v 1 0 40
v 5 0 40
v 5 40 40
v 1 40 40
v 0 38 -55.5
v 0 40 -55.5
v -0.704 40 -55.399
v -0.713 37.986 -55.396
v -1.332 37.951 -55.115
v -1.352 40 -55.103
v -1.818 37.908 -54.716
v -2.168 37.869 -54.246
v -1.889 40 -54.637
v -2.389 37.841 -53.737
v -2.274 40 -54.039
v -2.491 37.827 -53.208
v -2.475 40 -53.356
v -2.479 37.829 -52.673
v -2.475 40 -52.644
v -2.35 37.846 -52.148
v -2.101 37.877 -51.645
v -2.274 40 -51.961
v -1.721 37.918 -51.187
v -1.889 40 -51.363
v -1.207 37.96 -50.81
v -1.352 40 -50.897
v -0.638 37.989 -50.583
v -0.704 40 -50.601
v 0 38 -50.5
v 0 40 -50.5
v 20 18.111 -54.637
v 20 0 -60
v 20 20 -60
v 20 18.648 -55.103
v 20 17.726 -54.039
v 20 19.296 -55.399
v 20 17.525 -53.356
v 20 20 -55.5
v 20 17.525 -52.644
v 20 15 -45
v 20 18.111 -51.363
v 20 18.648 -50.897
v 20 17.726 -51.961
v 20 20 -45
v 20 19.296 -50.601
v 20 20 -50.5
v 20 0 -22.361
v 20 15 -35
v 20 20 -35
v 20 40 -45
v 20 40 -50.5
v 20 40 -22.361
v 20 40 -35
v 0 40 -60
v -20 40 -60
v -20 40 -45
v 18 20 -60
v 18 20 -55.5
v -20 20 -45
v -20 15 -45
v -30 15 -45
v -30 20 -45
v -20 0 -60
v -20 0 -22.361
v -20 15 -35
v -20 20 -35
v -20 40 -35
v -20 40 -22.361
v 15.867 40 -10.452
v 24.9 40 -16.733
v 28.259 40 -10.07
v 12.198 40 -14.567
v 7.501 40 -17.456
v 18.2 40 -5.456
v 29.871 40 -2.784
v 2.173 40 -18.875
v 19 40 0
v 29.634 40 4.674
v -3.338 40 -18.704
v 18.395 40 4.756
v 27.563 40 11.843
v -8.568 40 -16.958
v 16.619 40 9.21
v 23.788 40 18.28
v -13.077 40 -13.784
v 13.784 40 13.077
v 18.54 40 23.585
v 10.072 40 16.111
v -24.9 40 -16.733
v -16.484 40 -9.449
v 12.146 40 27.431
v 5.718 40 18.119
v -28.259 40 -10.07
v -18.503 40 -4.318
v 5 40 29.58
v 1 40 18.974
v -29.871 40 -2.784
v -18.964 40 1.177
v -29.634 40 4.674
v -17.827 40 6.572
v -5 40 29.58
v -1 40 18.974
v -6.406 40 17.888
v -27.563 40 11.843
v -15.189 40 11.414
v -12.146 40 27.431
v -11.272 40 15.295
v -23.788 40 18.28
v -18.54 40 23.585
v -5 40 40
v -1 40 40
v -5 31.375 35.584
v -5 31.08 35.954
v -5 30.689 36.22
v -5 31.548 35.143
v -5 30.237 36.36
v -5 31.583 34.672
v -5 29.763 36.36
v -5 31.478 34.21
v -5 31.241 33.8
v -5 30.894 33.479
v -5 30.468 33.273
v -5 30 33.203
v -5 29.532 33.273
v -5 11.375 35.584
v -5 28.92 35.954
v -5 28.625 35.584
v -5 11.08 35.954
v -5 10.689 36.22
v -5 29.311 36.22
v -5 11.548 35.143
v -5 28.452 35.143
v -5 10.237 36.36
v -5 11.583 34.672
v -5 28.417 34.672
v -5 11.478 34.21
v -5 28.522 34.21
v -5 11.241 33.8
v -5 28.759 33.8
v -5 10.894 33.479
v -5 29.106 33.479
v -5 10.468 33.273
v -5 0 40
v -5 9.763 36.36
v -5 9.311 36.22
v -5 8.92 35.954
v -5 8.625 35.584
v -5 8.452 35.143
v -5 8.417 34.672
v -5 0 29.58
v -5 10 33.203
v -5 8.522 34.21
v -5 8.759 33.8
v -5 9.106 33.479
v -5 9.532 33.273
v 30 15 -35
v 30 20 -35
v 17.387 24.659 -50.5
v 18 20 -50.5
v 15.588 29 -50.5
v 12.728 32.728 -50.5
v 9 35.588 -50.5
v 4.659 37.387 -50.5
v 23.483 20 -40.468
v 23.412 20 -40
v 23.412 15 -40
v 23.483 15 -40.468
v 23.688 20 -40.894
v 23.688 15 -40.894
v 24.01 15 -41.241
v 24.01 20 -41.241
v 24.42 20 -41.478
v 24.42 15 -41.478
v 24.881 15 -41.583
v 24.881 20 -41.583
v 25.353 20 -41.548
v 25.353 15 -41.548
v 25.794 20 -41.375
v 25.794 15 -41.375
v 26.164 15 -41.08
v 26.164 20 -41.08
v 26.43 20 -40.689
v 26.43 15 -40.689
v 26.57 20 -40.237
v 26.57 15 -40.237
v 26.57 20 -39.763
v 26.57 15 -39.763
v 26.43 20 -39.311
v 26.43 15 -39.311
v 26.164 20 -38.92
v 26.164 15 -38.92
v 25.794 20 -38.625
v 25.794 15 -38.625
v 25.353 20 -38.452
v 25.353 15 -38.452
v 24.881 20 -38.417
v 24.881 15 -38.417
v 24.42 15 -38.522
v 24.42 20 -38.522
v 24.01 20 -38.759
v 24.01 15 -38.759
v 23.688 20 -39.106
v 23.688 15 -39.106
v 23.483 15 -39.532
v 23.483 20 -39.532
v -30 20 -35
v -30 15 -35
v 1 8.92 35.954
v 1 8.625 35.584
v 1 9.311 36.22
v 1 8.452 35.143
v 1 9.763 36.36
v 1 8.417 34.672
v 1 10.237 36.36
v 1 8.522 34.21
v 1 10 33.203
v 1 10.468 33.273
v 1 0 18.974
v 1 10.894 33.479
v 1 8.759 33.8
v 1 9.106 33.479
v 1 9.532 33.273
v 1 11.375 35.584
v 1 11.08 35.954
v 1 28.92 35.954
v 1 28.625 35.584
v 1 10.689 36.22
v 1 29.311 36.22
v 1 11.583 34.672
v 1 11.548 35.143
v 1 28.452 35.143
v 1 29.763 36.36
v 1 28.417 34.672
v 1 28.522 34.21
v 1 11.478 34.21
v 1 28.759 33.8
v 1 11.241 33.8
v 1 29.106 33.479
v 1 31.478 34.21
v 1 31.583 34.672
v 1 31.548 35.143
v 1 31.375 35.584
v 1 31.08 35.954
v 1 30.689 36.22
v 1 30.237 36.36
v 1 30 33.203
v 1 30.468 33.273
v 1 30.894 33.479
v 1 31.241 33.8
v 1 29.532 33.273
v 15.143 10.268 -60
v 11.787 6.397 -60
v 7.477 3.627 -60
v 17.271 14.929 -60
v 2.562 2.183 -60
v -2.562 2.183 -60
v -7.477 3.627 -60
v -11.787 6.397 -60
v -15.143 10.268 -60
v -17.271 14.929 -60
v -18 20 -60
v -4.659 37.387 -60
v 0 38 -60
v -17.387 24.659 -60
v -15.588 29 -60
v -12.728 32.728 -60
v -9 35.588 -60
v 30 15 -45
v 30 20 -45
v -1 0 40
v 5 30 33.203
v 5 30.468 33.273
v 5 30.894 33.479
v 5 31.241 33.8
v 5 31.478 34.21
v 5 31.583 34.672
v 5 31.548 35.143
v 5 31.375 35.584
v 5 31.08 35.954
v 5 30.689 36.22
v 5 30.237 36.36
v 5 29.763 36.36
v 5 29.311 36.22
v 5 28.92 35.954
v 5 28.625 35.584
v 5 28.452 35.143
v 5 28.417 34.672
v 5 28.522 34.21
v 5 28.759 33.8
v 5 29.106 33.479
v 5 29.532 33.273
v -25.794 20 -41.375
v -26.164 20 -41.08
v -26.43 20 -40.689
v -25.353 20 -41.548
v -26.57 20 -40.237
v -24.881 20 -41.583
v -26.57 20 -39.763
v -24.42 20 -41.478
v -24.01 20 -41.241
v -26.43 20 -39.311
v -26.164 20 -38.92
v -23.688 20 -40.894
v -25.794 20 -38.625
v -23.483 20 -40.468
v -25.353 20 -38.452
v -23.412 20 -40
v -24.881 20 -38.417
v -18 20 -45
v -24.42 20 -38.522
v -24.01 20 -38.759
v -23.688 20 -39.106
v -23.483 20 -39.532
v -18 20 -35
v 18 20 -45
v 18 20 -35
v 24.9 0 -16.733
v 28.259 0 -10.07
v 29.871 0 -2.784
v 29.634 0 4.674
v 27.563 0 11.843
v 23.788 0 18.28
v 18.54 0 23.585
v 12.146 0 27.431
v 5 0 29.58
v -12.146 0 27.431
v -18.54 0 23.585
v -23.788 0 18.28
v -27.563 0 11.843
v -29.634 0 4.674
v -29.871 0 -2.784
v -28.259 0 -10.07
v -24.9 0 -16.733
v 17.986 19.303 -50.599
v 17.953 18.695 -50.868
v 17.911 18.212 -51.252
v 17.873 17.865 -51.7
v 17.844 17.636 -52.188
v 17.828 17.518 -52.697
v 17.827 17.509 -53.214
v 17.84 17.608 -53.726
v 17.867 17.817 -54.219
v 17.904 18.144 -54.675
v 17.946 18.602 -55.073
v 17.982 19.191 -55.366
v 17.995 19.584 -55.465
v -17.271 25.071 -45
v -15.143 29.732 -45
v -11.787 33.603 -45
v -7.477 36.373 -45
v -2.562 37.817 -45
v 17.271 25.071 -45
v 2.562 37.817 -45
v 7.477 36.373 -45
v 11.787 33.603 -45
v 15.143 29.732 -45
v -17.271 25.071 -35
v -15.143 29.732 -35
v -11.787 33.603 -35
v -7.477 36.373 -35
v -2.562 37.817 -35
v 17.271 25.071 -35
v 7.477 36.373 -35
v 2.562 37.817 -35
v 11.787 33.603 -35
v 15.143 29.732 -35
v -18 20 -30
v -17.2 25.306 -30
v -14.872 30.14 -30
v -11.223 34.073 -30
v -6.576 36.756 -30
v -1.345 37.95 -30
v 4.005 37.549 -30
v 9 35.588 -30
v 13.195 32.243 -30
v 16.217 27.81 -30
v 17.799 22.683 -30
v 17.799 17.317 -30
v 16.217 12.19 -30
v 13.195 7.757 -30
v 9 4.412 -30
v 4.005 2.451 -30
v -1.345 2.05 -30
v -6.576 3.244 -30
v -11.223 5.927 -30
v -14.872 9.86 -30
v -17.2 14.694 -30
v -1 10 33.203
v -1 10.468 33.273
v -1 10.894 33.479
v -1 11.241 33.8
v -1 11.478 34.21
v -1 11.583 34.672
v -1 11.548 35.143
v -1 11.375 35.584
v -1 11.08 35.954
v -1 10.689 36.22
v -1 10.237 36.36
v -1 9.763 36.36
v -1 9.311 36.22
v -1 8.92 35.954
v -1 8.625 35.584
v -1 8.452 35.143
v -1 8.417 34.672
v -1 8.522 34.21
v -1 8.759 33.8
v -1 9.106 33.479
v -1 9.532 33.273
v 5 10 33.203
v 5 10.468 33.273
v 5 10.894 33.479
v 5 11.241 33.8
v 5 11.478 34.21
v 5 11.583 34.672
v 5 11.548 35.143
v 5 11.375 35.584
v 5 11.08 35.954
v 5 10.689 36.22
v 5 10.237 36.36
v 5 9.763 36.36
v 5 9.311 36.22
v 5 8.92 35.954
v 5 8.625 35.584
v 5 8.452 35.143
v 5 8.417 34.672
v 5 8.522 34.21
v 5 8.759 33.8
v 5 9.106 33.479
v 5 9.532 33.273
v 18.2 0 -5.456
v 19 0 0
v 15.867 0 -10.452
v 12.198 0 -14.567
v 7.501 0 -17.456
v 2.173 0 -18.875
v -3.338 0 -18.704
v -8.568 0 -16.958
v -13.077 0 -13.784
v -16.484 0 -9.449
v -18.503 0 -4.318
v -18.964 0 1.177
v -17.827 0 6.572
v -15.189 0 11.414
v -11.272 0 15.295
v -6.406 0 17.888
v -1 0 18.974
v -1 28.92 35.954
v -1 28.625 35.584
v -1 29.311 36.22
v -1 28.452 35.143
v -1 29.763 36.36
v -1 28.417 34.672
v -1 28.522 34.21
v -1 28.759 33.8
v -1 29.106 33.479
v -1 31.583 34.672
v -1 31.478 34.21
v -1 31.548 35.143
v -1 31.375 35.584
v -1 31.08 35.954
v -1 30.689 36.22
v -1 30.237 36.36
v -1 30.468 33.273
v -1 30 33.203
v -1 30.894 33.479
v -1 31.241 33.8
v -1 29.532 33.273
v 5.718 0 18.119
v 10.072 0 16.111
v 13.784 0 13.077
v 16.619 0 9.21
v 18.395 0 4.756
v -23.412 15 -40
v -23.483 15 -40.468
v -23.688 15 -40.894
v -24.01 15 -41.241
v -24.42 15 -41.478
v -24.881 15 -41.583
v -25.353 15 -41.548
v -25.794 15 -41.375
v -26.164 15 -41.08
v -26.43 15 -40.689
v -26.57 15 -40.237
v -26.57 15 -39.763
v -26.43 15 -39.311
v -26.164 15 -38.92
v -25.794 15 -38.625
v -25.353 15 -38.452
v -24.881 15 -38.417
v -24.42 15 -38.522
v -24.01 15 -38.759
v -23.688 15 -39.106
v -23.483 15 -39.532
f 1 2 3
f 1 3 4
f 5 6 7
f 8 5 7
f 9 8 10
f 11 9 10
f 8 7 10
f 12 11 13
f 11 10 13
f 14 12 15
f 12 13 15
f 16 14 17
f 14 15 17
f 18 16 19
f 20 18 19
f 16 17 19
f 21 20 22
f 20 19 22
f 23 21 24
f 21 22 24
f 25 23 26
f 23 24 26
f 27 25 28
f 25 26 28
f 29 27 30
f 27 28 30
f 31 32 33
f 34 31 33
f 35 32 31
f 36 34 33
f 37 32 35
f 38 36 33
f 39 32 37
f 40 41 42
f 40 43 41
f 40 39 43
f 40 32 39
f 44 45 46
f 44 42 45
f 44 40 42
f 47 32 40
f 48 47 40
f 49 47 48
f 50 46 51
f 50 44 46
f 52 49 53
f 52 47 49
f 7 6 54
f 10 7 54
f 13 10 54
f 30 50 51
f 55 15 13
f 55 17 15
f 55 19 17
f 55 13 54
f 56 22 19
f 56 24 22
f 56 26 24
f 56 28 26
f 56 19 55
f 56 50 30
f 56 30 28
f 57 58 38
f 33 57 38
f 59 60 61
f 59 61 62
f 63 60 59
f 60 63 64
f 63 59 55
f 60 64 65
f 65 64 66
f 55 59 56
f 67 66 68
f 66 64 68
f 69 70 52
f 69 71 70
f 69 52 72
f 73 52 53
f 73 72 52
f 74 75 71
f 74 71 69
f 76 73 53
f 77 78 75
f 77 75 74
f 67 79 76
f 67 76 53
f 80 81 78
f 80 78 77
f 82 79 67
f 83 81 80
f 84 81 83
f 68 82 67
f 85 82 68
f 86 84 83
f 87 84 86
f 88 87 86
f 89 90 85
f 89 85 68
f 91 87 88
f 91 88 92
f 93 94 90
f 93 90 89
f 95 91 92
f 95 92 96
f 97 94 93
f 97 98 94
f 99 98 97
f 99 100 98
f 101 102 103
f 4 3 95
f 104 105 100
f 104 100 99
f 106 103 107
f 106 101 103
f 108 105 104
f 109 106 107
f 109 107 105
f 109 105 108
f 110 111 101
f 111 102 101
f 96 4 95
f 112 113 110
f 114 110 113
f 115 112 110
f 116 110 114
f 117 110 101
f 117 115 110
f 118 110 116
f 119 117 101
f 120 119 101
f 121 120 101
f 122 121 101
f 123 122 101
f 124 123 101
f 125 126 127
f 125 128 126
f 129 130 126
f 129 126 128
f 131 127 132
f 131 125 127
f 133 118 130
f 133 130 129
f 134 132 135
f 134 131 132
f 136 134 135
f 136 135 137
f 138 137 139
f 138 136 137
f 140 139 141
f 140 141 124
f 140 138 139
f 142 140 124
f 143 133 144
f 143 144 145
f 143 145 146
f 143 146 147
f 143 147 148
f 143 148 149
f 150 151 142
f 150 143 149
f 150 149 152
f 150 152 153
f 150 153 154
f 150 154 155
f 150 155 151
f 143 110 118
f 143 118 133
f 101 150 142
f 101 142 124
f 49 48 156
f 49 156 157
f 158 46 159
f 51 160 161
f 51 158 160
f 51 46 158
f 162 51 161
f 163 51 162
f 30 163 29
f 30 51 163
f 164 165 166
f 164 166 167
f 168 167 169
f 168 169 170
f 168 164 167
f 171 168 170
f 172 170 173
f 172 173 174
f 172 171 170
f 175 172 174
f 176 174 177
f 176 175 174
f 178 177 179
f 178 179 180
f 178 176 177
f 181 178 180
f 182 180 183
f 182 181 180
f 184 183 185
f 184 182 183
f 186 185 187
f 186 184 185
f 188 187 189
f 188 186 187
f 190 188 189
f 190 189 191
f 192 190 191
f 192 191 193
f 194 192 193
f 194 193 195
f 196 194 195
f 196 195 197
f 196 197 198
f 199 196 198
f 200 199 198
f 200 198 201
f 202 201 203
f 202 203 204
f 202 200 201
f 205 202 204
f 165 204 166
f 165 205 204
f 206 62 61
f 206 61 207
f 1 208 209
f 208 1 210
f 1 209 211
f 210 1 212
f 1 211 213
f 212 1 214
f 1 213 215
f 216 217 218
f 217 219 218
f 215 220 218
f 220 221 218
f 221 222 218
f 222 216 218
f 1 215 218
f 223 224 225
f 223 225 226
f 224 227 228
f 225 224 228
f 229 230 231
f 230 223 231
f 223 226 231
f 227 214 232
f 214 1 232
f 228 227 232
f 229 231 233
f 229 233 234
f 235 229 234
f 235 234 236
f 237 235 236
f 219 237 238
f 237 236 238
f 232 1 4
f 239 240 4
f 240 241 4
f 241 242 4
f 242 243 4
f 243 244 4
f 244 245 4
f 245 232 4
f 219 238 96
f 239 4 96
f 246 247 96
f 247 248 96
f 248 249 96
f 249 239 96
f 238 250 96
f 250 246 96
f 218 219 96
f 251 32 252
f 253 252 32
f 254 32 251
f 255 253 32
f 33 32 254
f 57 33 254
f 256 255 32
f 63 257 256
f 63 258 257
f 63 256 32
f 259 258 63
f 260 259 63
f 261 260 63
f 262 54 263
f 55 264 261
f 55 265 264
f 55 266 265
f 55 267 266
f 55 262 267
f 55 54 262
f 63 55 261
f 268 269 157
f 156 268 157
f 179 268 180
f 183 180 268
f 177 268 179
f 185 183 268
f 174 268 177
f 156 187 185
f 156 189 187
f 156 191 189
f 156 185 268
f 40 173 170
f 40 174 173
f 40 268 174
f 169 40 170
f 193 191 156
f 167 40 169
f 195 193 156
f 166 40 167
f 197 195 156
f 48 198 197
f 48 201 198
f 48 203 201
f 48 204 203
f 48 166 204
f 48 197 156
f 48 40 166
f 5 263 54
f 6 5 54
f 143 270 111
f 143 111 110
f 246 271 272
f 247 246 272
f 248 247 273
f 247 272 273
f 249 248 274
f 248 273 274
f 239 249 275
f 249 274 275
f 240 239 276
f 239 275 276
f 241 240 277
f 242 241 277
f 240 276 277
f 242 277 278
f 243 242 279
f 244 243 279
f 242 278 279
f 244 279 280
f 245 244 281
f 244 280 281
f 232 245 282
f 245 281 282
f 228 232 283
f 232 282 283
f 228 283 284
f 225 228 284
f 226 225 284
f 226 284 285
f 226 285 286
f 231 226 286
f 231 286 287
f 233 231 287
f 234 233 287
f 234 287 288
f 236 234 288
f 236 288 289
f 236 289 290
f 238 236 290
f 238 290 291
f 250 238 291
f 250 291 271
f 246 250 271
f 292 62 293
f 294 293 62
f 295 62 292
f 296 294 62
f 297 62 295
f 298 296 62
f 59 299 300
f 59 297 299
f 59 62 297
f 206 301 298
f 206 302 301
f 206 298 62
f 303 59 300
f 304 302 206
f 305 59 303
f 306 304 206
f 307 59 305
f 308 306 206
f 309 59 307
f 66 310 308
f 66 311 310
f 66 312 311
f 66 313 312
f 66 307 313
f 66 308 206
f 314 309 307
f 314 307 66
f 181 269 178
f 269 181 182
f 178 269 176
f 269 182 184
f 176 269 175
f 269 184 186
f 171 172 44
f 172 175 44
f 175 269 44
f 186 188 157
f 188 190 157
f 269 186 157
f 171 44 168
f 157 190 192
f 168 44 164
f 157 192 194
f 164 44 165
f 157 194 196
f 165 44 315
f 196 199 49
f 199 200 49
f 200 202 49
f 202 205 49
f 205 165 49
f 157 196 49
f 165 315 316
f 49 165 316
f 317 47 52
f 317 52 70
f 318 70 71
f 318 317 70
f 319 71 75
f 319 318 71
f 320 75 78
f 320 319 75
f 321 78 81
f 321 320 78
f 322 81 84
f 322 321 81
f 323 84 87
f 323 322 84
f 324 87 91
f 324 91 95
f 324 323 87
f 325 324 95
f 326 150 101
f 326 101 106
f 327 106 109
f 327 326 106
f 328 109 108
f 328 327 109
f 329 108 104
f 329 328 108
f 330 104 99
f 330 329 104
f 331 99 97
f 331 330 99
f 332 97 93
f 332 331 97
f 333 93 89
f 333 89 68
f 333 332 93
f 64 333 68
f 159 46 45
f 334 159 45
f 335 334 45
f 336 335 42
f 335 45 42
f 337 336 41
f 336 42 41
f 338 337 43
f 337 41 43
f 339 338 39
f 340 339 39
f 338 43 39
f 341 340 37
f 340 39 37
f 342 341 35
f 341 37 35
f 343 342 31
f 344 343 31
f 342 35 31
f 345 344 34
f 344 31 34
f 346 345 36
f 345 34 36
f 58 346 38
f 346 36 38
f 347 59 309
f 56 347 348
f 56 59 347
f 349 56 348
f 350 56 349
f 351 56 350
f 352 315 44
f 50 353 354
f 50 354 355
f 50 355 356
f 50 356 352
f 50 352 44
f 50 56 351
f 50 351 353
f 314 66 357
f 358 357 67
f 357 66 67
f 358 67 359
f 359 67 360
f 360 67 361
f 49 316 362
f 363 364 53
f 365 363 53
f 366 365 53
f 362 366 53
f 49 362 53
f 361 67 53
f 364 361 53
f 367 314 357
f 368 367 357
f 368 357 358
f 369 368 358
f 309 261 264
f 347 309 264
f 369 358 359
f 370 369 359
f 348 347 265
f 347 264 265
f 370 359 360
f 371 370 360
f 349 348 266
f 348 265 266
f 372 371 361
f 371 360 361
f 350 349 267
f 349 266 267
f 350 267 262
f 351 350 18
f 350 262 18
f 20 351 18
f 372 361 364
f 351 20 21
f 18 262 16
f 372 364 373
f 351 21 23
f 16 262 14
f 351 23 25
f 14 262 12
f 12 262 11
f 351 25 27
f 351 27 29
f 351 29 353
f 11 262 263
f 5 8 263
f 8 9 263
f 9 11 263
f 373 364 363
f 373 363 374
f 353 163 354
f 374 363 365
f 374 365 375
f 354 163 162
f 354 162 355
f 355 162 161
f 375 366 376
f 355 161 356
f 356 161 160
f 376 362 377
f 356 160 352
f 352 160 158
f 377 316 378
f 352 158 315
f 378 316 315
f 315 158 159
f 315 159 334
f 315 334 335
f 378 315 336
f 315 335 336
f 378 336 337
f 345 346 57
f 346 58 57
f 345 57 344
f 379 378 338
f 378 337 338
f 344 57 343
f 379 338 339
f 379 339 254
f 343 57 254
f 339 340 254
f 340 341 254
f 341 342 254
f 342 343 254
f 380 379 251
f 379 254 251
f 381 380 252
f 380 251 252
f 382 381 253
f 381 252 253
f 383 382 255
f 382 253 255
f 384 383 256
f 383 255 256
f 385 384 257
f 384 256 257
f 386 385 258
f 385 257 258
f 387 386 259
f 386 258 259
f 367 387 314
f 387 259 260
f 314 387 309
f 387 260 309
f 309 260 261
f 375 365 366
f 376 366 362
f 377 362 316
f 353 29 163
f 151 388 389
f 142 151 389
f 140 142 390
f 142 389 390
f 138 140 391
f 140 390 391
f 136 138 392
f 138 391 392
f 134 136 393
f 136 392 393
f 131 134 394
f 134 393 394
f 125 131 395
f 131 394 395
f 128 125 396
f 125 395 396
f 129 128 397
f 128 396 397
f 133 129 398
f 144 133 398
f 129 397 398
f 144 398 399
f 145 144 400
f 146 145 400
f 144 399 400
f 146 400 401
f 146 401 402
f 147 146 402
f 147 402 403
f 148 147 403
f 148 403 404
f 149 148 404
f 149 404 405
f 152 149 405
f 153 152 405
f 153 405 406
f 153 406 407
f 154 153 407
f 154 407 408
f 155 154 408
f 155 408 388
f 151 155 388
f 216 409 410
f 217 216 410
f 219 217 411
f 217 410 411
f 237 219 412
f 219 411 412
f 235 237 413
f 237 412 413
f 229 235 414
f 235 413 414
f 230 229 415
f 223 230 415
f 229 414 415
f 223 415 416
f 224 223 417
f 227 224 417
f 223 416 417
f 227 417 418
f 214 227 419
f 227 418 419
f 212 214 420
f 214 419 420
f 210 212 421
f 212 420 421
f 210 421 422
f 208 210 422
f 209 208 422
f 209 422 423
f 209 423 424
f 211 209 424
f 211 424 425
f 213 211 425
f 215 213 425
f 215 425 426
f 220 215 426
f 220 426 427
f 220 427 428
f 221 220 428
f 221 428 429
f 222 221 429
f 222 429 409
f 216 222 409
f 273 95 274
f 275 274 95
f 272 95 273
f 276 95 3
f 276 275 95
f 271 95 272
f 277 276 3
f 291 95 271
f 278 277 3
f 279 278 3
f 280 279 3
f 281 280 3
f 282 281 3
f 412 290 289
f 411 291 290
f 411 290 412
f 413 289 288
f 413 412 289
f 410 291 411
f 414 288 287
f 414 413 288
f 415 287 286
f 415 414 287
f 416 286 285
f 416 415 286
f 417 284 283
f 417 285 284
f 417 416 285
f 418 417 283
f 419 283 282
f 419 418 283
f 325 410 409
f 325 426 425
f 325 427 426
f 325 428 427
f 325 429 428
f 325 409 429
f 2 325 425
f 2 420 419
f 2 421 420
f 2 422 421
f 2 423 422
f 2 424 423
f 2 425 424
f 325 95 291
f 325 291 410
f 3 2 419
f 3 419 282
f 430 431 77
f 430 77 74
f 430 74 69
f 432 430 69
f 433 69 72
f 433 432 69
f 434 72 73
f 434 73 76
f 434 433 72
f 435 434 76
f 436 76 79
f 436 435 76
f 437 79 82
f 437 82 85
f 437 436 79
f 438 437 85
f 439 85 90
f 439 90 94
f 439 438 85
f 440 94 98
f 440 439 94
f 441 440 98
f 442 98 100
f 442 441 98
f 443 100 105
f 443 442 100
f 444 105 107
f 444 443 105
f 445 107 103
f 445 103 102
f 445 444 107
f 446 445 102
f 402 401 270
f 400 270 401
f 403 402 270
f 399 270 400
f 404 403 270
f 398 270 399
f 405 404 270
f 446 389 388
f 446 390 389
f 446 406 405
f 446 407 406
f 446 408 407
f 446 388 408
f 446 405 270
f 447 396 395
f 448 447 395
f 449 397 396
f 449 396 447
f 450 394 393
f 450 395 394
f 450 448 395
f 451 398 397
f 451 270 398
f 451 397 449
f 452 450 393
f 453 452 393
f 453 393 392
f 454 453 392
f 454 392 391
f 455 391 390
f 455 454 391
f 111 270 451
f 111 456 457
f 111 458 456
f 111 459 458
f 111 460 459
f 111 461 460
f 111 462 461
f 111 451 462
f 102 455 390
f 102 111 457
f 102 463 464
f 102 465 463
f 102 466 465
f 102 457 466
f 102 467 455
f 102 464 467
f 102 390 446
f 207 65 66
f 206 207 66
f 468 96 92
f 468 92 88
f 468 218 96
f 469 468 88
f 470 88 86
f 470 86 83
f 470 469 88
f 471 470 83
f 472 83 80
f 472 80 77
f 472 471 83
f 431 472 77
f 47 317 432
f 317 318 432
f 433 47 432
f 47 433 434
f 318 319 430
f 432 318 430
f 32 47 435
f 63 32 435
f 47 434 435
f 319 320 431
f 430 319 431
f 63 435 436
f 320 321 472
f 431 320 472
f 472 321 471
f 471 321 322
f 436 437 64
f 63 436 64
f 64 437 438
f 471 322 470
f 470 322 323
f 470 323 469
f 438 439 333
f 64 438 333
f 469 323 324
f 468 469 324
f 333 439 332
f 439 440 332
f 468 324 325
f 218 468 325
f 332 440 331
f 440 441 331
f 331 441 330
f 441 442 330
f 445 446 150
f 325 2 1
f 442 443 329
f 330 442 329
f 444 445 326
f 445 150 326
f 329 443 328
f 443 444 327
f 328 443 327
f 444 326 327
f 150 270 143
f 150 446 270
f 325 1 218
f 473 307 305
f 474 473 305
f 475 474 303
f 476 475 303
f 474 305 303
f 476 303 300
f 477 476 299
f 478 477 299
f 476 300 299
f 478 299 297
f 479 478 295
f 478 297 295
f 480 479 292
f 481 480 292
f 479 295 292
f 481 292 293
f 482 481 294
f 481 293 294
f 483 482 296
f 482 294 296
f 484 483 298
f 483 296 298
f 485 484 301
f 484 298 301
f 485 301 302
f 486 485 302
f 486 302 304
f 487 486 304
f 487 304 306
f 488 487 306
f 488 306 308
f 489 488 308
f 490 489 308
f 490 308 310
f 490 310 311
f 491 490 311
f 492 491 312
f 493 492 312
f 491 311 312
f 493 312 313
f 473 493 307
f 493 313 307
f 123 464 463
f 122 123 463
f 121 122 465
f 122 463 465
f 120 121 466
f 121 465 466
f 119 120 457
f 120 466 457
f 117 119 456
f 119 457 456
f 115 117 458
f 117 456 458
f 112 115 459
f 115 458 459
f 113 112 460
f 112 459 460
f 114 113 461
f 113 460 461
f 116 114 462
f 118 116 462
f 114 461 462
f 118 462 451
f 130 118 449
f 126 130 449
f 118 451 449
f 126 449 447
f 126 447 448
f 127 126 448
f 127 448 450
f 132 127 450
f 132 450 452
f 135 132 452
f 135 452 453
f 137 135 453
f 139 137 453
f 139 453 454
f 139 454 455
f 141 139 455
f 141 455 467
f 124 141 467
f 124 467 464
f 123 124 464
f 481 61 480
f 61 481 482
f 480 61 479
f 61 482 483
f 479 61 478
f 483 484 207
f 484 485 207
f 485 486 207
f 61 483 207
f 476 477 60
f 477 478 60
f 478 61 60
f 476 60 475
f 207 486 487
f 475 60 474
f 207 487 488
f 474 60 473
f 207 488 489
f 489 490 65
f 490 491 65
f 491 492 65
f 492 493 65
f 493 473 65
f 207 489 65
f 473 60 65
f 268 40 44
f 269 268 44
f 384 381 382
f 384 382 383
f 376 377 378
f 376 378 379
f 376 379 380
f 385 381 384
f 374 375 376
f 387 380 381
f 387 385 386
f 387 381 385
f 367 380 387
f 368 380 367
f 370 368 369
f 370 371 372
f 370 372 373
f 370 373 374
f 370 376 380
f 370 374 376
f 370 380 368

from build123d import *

# Parameters (mm, degrees)
SKETCH1_R           = 19
BOSS_EXTRUDE1_DEPTH = 40
SKETCH4_W           = 40
SKETCH4_H           = 40
BOSS_EXTRUDE2_DEPTH = 30
SKETCH5_R           = 18
CUT_EXTRUDE3_DEPTH  = 30
SKETCH8_R           = 2.5
CUT_EXTRUDE5_DEPTH  = 10
SKETCH2_W           = 2
SKETCH2_H           = 21.052668078
CUT_EXTRUDE1_DEPTH  = 40
SKETCH3_R           = 1.5875
CUT_EXTRUDE2_DEPTH  = 35
SKETCH9_W           = 40
SKETCH9_H           = 10
CUT_EXTRUDE6_DEPTH  = 20
SKETCH10_W          = 10
SKETCH10_H          = 5
BOSS_EXTRUDE3_DEPTH = 10
SKETCH11_R          = 1.5875
CUT_EXTRUDE7_DEPTH  = 5
SKETCH12_W          = 20
SKETCH12_H          = 20
CUT_EXTRUDE9_DEPTH  = 2.5
CUT_EXTRUDE10_REACH = 52
SKETCH13_R          = 2.5
SKETCH14_W          = 20
SKETCH14_H          = 20
CUT_EXTRUDE11_DEPTH = 4.5


with BuildPart() as part:
    # Sketch1 → Boss-Extrude1 (new body)
    with BuildSketch(Plane(origin=(0, 0, 0), x_dir=(1, 0, 0), z_dir=(0, 1, 0))):
        with BuildLine():
            Line((5, -40), (-5, -40))
            Line((-5, -40), (-5, -29.580398915))
            ThreePointArc((-5, -29.580398915), (-28.822194814, -8.323526063), (-20, 22.360679775))
            Line((-20, 22.360679775), (-20, 30))
            Line((-20, 30), (20, 30))
            Line((20, 30), (20, 22.360679775))
            ThreePointArc((20, 22.360679775), (28.822194814, -8.323526063), (5, -29.580398915))
            Line((5, -29.580398915), (5, -40))
        make_face()
        Circle(SKETCH1_R, mode=Mode.SUBTRACT)
    extrude(amount=BOSS_EXTRUDE1_DEPTH)

    # Sketch4 → Boss-Extrude2 (add)
    with BuildSketch(Plane(origin=(0, 0, -30), x_dir=(-1, 0, 0), z_dir=(0, 0, -1))):
        with Locations((0, 20)):
            Rectangle(SKETCH4_W, SKETCH4_H)
    extrude(amount=BOSS_EXTRUDE2_DEPTH)

    # Sketch5 → Cut-Extrude3 (cut)
    with BuildSketch(Plane(origin=(0, 0, -60), x_dir=(-1, 0, 0), z_dir=(0, 0, -1))):
        with Locations((0, 20)):
            Circle(SKETCH5_R)
    extrude(amount=-CUT_EXTRUDE3_DEPTH, mode=Mode.SUBTRACT)

    # Sketch8 → Cut-Extrude5 (cut)
    with BuildSketch(Plane(origin=(0, 40, 0), x_dir=(1, 0, 0), z_dir=(0, 1, 0))):
        with Locations((0, 53)):
            Circle(SKETCH8_R)
    extrude(amount=-CUT_EXTRUDE5_DEPTH, mode=Mode.SUBTRACT)

    # Sketch2 → Cut-Extrude1 (cut)
    with BuildSketch(Plane(origin=(0, 40, 0), x_dir=(1, 0, 0), z_dir=(0, 1, 0))):
        with Locations((0, -29.5)):
            Rectangle(SKETCH2_W, SKETCH2_H)
    extrude(amount=-CUT_EXTRUDE1_DEPTH, mode=Mode.SUBTRACT)

    # Sketch3 → Cut-Extrude2 (cut)
    with BuildSketch(Plane(origin=(5, 0, 0), x_dir=(0, 0, -1), z_dir=(1, 0, 0))):
        with Locations((-34.790199458, 30)):
            Circle(SKETCH3_R)
        with Locations((-34.790199458, 10)):
            Circle(SKETCH3_R)
    extrude(amount=-CUT_EXTRUDE2_DEPTH, mode=Mode.SUBTRACT)

    # Sketch9 → Cut-Extrude6 (cut)
    with BuildSketch(Plane(origin=(0, 40, 0), x_dir=(1, 0, 0), z_dir=(0, 1, 0))):
        with Locations((0, 40)):
            Rectangle(SKETCH9_W, SKETCH9_H)
    extrude(amount=-CUT_EXTRUDE6_DEPTH, mode=Mode.SUBTRACT)

    # Sketch10 → Boss-Extrude3 (add)
    with BuildSketch(Plane.ZY.offset(20)):
        with Locations((-40, 17.5)):
            Rectangle(SKETCH10_W, SKETCH10_H)
    boss_extrude3 = extrude(amount=BOSS_EXTRUDE3_DEPTH)

    # Sketch11 → Cut-Extrude7 (cut)
    with BuildSketch(Plane(origin=(0, 20, 0), x_dir=(1, 0, 0), z_dir=(0, 1, 0))):
        with Locations((-25, 40)):
            Circle(SKETCH11_R)
    cut_extrude7 = extrude(amount=-CUT_EXTRUDE7_DEPTH, mode=Mode.SUBTRACT)

    # Mirror1: Boss-Extrude3, Cut-Extrude7 across plane
    add(boss_extrude3.mirror(Plane(origin=(0, 0, 0), x_dir=(0, 0, 1), z_dir=(1, 0, 0))))
    add(cut_extrude7.mirror(Plane(origin=(0, 0, 0), x_dir=(0, 0, 1), z_dir=(1, 0, 0))), mode=Mode.SUBTRACT)

    # Sketch12 → Cut-Extrude9 (cut, symmetric)
    with BuildSketch(Plane(origin=(0, 0, -53), x_dir=(-1, 0, 0), z_dir=(0, 0, -1))):
        with Locations((-10, 30)):
            Rectangle(SKETCH12_W, SKETCH12_H)
    extrude(amount=CUT_EXTRUDE9_DEPTH, both=True, mode=Mode.SUBTRACT)

    # Sketch13 → Cut-Extrude10 (cut, up to next)
    with BuildSketch(Plane(origin=(20, 0, 0), x_dir=(0, 0, -1), z_dir=(1, 0, 0)), mode=Mode.PRIVATE) as cut_extrude10_sk1:
        with Locations((53, 20)):
            Circle(SKETCH13_R)
    cut_extrude10_tool1 = extrude(cut_extrude10_sk1.sketch, amount=-CUT_EXTRUDE10_REACH, mode=Mode.PRIVATE) & part.part
    add(cut_extrude10_tool1.solids().sort_by_distance((20, 20, -53))[0], mode=Mode.SUBTRACT)

    # Sketch14 → Cut-Extrude11 (cut)
    with BuildSketch(Plane.XY.offset(-55.5)):
        with Locations((10, 30)):
            Rectangle(SKETCH14_W, SKETCH14_H)
    extrude(amount=-CUT_EXTRUDE11_DEPTH, mode=Mode.SUBTRACT)


solid = part.part
